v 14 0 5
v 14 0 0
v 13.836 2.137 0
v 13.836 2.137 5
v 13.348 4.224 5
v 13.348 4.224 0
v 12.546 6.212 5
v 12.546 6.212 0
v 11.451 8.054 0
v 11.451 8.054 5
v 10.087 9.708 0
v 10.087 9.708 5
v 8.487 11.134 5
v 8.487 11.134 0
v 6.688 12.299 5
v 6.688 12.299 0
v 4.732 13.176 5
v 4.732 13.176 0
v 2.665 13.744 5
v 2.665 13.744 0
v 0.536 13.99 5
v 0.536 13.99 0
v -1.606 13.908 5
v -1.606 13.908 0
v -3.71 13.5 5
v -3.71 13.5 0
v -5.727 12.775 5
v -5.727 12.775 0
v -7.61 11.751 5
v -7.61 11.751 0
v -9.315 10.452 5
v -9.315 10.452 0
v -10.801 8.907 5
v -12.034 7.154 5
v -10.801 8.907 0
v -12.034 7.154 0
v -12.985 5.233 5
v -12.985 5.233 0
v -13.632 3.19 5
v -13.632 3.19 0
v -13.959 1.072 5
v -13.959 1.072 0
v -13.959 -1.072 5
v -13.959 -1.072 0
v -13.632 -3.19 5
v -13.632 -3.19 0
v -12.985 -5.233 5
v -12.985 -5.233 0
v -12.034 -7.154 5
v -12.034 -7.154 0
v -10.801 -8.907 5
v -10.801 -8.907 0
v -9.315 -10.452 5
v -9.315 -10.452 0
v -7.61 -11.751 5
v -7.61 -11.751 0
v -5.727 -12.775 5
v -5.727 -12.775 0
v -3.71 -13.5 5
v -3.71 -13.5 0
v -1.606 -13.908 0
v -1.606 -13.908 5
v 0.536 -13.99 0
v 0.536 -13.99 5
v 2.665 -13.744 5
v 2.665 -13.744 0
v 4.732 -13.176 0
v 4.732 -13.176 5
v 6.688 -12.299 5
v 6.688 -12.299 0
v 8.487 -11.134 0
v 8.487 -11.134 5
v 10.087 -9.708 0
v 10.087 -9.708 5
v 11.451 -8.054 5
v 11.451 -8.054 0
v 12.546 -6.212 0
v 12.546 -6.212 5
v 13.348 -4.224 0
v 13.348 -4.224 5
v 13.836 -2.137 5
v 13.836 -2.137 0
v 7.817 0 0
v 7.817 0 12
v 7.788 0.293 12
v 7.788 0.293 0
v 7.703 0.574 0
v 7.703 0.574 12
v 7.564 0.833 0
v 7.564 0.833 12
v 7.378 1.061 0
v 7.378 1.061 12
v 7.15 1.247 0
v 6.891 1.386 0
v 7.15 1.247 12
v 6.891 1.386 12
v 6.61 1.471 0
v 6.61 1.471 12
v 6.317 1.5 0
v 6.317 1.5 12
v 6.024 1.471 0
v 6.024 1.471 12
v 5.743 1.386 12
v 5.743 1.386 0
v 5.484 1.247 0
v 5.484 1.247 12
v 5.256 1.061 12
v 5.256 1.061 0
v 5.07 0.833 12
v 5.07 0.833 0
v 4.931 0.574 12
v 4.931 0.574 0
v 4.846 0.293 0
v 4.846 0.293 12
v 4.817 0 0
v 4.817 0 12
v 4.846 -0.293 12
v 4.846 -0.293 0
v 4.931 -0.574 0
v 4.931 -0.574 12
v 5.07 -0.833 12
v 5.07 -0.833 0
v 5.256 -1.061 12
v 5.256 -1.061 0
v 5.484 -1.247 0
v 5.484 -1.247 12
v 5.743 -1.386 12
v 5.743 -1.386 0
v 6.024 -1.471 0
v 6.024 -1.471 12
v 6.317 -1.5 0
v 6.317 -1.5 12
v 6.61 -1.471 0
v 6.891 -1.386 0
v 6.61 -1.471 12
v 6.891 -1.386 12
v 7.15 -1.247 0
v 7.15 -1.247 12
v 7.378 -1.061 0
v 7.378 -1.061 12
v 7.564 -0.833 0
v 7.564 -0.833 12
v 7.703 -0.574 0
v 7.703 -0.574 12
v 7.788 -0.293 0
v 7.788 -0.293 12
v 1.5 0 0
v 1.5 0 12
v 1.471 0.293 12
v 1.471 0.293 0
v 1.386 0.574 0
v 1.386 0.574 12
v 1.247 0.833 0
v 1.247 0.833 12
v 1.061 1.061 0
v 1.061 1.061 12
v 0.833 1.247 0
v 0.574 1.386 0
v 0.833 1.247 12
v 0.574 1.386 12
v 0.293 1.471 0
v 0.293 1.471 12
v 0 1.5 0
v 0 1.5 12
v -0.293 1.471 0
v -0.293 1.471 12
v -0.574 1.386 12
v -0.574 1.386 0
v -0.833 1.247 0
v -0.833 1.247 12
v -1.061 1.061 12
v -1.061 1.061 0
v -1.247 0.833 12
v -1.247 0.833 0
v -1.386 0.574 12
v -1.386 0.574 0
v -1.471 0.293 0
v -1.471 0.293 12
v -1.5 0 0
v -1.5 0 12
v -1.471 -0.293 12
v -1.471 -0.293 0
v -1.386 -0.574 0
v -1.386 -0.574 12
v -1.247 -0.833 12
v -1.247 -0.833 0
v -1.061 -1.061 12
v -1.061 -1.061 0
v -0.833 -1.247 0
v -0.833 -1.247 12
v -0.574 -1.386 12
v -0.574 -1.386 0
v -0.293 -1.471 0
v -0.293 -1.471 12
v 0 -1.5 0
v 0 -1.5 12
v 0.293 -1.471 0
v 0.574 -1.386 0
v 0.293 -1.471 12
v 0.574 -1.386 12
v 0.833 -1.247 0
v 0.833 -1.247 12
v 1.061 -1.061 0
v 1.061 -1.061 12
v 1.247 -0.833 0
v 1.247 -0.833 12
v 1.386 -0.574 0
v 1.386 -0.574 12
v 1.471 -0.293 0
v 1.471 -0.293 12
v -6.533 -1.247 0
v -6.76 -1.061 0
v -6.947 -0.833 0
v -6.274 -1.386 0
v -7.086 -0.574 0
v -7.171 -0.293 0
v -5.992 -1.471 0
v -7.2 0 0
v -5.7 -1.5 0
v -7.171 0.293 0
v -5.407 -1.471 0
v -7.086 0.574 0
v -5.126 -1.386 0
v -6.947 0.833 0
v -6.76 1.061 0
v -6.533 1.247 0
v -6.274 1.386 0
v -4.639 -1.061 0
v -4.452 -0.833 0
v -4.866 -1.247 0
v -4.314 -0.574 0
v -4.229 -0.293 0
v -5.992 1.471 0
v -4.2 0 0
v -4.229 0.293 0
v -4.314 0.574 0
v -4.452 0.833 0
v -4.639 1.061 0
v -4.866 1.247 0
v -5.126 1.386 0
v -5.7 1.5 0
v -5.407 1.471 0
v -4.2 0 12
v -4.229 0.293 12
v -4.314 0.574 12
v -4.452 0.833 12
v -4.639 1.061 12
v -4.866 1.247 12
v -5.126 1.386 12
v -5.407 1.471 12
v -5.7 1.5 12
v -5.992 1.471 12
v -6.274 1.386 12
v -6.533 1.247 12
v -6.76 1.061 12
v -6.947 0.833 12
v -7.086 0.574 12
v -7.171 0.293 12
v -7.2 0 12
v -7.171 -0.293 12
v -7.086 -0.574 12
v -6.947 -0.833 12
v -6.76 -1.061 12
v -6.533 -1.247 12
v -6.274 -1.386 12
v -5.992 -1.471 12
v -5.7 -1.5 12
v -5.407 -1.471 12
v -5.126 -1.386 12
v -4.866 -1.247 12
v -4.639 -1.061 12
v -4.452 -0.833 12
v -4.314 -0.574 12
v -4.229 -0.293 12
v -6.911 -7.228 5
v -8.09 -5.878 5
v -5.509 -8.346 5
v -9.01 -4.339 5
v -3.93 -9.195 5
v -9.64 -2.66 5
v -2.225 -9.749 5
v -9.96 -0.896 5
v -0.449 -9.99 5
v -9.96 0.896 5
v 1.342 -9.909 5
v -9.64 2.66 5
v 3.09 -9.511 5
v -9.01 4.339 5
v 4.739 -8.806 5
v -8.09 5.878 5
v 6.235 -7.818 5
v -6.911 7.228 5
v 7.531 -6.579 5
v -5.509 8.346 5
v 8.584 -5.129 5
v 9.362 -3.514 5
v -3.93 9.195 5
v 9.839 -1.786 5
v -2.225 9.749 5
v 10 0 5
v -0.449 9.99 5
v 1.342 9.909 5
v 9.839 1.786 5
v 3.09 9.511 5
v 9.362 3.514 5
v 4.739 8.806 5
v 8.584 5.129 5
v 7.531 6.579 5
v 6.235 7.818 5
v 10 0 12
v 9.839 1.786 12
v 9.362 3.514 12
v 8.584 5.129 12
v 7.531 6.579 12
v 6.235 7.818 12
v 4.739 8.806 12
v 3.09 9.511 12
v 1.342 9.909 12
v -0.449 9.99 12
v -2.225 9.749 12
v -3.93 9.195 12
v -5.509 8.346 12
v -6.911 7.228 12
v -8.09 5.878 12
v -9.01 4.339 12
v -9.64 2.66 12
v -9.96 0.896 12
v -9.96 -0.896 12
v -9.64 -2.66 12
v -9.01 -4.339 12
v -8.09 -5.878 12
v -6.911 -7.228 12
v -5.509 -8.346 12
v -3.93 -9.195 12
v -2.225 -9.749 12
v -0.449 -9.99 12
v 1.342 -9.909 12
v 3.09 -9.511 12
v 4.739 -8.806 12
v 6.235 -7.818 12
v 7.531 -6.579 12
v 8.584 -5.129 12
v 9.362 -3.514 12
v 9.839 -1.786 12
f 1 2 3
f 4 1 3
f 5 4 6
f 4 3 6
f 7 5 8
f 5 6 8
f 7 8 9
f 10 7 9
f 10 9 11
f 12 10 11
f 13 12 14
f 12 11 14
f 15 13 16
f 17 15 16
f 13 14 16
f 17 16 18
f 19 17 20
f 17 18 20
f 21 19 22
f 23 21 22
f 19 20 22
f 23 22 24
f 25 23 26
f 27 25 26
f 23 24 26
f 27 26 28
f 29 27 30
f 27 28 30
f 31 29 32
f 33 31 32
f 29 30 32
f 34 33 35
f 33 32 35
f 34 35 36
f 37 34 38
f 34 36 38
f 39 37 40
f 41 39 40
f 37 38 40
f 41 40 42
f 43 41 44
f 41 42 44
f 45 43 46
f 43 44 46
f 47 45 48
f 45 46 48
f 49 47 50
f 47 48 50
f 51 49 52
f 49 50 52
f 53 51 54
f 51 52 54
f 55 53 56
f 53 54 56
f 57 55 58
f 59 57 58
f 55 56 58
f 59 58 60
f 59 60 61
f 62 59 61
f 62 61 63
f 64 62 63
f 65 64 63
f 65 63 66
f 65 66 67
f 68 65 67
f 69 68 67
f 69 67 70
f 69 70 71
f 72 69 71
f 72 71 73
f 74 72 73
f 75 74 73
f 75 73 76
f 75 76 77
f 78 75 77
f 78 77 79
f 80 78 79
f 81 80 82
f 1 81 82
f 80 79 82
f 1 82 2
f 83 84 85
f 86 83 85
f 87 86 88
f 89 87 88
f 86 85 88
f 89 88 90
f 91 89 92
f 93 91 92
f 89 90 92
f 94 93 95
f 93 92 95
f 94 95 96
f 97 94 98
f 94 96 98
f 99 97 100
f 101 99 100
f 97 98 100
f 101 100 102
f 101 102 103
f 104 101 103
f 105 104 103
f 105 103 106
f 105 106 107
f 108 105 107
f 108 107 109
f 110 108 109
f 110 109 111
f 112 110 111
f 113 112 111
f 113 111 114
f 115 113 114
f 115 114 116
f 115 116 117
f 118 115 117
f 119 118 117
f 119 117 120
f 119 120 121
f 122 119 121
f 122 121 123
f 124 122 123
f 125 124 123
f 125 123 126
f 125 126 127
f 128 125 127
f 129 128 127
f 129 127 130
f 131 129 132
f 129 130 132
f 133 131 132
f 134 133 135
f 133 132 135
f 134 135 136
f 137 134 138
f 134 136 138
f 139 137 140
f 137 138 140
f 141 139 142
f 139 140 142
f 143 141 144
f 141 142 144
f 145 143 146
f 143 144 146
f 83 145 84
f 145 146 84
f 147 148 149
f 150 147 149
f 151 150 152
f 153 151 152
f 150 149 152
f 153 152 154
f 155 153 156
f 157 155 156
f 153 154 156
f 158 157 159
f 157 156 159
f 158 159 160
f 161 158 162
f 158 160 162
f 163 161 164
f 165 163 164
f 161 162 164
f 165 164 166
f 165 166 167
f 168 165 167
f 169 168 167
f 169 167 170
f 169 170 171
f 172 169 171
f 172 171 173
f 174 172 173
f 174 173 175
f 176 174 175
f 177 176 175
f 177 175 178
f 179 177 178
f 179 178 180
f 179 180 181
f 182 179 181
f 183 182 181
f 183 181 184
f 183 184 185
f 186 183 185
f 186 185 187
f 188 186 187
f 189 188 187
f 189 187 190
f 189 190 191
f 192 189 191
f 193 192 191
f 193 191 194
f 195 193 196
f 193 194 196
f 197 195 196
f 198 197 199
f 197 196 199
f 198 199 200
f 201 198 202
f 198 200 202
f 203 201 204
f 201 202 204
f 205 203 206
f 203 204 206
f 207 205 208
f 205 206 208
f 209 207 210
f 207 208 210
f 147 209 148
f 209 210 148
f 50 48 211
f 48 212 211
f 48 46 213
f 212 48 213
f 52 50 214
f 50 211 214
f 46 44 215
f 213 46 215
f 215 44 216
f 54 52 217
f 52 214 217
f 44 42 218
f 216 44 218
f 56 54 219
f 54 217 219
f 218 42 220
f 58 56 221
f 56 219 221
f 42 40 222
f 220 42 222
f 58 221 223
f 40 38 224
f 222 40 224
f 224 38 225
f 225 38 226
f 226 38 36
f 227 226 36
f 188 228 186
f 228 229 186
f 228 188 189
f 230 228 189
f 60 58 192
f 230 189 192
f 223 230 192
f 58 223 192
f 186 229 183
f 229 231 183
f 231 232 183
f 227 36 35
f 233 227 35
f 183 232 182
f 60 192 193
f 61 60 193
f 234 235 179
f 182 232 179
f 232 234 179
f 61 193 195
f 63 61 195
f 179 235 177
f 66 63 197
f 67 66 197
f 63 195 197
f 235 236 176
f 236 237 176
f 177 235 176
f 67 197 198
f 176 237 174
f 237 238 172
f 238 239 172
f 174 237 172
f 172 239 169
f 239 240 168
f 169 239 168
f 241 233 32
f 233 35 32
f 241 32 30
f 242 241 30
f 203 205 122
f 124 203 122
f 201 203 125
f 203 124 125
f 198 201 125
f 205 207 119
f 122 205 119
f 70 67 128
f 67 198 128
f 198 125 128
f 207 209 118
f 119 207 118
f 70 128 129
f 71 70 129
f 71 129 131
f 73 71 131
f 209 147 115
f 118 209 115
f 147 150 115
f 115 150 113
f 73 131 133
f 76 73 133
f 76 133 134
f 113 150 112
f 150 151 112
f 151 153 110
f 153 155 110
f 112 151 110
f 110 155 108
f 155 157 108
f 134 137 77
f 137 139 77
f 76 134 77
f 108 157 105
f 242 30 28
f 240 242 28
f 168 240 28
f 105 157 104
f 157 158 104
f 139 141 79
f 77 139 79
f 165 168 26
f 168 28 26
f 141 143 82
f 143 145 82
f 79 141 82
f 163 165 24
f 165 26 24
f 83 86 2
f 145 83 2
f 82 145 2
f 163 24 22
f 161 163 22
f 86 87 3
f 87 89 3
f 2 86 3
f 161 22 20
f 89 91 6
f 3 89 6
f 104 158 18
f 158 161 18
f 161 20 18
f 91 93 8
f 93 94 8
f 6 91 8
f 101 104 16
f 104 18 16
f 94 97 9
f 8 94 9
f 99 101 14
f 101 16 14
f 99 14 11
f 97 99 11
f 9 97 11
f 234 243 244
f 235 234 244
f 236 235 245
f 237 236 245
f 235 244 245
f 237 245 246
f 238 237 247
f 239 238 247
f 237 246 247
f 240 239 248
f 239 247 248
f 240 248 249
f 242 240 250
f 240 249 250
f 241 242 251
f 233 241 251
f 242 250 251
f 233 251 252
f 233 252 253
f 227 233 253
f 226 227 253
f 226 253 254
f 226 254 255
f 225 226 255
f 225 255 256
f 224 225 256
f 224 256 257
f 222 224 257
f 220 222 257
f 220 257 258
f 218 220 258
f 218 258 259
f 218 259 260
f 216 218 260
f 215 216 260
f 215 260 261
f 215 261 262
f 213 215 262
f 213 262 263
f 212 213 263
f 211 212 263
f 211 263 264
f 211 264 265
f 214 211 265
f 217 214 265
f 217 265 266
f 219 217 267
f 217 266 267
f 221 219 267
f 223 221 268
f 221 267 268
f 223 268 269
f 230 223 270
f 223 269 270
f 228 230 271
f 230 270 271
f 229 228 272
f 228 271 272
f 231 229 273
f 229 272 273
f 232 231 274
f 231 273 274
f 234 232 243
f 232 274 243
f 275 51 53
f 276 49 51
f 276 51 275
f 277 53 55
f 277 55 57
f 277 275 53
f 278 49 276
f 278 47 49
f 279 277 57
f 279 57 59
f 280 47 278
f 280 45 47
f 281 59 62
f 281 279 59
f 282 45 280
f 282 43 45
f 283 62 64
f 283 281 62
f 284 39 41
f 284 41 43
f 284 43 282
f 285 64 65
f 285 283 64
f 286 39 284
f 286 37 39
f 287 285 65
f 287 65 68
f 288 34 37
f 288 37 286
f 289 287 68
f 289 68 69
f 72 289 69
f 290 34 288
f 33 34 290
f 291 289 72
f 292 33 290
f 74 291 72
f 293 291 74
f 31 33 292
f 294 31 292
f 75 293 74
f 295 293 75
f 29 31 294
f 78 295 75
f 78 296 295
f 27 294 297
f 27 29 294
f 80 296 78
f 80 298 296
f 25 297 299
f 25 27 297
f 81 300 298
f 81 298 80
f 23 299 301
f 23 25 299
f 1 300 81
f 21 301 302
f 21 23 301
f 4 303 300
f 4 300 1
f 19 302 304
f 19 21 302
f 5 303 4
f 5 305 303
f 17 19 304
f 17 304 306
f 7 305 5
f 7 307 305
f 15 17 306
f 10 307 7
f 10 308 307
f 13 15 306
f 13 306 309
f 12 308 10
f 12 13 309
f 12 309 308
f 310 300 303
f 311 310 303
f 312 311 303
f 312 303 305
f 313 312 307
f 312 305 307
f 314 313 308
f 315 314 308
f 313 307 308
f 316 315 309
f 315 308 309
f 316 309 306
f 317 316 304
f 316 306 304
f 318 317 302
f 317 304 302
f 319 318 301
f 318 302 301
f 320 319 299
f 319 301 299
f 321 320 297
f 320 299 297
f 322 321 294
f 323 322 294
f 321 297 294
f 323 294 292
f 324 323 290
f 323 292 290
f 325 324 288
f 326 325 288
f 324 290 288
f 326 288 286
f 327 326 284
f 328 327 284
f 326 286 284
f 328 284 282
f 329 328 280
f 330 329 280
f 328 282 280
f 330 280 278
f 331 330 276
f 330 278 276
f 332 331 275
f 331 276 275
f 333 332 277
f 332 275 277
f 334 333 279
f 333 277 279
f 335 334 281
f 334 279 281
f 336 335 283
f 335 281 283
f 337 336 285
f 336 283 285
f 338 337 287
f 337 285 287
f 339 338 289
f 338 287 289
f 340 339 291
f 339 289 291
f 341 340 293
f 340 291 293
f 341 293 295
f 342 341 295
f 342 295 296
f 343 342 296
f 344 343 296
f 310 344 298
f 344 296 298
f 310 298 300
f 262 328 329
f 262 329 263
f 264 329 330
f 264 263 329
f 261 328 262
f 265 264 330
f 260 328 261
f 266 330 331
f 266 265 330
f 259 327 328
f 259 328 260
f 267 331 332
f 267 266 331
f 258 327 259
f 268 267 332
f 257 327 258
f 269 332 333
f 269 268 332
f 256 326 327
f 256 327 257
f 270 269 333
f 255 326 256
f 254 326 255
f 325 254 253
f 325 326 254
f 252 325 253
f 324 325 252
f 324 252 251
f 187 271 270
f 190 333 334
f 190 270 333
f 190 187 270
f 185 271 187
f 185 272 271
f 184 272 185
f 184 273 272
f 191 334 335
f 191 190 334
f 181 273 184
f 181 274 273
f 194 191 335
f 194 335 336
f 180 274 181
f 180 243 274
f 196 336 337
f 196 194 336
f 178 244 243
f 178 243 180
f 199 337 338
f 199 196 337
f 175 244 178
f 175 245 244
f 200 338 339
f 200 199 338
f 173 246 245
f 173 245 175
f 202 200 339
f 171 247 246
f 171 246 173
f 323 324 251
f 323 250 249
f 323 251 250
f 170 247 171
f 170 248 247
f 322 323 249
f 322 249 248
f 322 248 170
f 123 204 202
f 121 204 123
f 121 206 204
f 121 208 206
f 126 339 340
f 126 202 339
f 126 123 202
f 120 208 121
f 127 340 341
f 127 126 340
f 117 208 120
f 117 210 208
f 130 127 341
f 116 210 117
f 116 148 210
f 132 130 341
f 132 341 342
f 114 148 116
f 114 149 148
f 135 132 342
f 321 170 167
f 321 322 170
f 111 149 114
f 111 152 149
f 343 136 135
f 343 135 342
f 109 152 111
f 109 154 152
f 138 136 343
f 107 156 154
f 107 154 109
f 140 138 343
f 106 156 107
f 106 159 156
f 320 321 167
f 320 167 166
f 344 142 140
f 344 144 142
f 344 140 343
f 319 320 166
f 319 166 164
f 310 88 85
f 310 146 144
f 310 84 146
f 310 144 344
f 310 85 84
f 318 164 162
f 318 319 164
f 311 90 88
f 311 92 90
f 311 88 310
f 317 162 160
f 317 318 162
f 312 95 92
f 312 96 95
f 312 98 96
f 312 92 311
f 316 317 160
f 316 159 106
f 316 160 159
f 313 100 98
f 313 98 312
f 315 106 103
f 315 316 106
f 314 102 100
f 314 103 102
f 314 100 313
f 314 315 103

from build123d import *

# Parameters (mm, degrees)
SKETCH1_R           = 14
BOSS_EXTRUDE1_DEPTH = 5
SKETCH2_R           = 10
BOSS_EXTRUDE2_DEPTH = 7
SKETCH3_R           = 1.5
CUT_EXTRUDE1_DEPTH  = 24.151673806
CUT_EXTRUDE2_REACH  = 25.152
SKETCH4_R           = 1.5


with BuildPart() as part:
    # Sketch1 → Boss-Extrude1 (new body)
    with BuildSketch(Plane.XY):
        Circle(SKETCH1_R)
    extrude(amount=BOSS_EXTRUDE1_DEPTH)

    # Sketch2 → Boss-Extrude2 (add)
    with BuildSketch(Plane.XY.offset(5)):
        Circle(SKETCH2_R)
    extrude(amount=BOSS_EXTRUDE2_DEPTH)

    # Sketch3 → Cut-Extrude1 (cut, through all)
    with BuildSketch(Plane.XY.offset(12)):
        Circle(SKETCH3_R)
    extrude(amount=-CUT_EXTRUDE1_DEPTH, mode=Mode.SUBTRACT)

    # Sketch4 → Cut-Extrude2 (cut, up to next)
    with BuildSketch(Plane.XY.offset(12), mode=Mode.PRIVATE) as cut_extrude2_sk1:
        with Locations((-5.699704026, 0)):
            Circle(SKETCH4_R)
    cut_extrude2_tool1 = extrude(cut_extrude2_sk1.sketch, amount=-CUT_EXTRUDE2_REACH, mode=Mode.PRIVATE) & part.part
    # Sketch4 → Cut-Extrude2 (cut, up to next)
    with BuildSketch(Plane.XY.offset(12), mode=Mode.PRIVATE) as cut_extrude2_sk2:
        with Locations((6.316954824, 0)):
            Circle(SKETCH4_R)
    cut_extrude2_tool2 = extrude(cut_extrude2_sk2.sketch, amount=-CUT_EXTRUDE2_REACH, mode=Mode.PRIVATE) & part.part
    add(cut_extrude2_tool1.solids().sort_by_distance((-5.699704, 0, 12))[0], mode=Mode.SUBTRACT)
    add(cut_extrude2_tool2.solids().sort_by_distance((6.316955, 0, 12))[0], mode=Mode.SUBTRACT)


solid = part.part
